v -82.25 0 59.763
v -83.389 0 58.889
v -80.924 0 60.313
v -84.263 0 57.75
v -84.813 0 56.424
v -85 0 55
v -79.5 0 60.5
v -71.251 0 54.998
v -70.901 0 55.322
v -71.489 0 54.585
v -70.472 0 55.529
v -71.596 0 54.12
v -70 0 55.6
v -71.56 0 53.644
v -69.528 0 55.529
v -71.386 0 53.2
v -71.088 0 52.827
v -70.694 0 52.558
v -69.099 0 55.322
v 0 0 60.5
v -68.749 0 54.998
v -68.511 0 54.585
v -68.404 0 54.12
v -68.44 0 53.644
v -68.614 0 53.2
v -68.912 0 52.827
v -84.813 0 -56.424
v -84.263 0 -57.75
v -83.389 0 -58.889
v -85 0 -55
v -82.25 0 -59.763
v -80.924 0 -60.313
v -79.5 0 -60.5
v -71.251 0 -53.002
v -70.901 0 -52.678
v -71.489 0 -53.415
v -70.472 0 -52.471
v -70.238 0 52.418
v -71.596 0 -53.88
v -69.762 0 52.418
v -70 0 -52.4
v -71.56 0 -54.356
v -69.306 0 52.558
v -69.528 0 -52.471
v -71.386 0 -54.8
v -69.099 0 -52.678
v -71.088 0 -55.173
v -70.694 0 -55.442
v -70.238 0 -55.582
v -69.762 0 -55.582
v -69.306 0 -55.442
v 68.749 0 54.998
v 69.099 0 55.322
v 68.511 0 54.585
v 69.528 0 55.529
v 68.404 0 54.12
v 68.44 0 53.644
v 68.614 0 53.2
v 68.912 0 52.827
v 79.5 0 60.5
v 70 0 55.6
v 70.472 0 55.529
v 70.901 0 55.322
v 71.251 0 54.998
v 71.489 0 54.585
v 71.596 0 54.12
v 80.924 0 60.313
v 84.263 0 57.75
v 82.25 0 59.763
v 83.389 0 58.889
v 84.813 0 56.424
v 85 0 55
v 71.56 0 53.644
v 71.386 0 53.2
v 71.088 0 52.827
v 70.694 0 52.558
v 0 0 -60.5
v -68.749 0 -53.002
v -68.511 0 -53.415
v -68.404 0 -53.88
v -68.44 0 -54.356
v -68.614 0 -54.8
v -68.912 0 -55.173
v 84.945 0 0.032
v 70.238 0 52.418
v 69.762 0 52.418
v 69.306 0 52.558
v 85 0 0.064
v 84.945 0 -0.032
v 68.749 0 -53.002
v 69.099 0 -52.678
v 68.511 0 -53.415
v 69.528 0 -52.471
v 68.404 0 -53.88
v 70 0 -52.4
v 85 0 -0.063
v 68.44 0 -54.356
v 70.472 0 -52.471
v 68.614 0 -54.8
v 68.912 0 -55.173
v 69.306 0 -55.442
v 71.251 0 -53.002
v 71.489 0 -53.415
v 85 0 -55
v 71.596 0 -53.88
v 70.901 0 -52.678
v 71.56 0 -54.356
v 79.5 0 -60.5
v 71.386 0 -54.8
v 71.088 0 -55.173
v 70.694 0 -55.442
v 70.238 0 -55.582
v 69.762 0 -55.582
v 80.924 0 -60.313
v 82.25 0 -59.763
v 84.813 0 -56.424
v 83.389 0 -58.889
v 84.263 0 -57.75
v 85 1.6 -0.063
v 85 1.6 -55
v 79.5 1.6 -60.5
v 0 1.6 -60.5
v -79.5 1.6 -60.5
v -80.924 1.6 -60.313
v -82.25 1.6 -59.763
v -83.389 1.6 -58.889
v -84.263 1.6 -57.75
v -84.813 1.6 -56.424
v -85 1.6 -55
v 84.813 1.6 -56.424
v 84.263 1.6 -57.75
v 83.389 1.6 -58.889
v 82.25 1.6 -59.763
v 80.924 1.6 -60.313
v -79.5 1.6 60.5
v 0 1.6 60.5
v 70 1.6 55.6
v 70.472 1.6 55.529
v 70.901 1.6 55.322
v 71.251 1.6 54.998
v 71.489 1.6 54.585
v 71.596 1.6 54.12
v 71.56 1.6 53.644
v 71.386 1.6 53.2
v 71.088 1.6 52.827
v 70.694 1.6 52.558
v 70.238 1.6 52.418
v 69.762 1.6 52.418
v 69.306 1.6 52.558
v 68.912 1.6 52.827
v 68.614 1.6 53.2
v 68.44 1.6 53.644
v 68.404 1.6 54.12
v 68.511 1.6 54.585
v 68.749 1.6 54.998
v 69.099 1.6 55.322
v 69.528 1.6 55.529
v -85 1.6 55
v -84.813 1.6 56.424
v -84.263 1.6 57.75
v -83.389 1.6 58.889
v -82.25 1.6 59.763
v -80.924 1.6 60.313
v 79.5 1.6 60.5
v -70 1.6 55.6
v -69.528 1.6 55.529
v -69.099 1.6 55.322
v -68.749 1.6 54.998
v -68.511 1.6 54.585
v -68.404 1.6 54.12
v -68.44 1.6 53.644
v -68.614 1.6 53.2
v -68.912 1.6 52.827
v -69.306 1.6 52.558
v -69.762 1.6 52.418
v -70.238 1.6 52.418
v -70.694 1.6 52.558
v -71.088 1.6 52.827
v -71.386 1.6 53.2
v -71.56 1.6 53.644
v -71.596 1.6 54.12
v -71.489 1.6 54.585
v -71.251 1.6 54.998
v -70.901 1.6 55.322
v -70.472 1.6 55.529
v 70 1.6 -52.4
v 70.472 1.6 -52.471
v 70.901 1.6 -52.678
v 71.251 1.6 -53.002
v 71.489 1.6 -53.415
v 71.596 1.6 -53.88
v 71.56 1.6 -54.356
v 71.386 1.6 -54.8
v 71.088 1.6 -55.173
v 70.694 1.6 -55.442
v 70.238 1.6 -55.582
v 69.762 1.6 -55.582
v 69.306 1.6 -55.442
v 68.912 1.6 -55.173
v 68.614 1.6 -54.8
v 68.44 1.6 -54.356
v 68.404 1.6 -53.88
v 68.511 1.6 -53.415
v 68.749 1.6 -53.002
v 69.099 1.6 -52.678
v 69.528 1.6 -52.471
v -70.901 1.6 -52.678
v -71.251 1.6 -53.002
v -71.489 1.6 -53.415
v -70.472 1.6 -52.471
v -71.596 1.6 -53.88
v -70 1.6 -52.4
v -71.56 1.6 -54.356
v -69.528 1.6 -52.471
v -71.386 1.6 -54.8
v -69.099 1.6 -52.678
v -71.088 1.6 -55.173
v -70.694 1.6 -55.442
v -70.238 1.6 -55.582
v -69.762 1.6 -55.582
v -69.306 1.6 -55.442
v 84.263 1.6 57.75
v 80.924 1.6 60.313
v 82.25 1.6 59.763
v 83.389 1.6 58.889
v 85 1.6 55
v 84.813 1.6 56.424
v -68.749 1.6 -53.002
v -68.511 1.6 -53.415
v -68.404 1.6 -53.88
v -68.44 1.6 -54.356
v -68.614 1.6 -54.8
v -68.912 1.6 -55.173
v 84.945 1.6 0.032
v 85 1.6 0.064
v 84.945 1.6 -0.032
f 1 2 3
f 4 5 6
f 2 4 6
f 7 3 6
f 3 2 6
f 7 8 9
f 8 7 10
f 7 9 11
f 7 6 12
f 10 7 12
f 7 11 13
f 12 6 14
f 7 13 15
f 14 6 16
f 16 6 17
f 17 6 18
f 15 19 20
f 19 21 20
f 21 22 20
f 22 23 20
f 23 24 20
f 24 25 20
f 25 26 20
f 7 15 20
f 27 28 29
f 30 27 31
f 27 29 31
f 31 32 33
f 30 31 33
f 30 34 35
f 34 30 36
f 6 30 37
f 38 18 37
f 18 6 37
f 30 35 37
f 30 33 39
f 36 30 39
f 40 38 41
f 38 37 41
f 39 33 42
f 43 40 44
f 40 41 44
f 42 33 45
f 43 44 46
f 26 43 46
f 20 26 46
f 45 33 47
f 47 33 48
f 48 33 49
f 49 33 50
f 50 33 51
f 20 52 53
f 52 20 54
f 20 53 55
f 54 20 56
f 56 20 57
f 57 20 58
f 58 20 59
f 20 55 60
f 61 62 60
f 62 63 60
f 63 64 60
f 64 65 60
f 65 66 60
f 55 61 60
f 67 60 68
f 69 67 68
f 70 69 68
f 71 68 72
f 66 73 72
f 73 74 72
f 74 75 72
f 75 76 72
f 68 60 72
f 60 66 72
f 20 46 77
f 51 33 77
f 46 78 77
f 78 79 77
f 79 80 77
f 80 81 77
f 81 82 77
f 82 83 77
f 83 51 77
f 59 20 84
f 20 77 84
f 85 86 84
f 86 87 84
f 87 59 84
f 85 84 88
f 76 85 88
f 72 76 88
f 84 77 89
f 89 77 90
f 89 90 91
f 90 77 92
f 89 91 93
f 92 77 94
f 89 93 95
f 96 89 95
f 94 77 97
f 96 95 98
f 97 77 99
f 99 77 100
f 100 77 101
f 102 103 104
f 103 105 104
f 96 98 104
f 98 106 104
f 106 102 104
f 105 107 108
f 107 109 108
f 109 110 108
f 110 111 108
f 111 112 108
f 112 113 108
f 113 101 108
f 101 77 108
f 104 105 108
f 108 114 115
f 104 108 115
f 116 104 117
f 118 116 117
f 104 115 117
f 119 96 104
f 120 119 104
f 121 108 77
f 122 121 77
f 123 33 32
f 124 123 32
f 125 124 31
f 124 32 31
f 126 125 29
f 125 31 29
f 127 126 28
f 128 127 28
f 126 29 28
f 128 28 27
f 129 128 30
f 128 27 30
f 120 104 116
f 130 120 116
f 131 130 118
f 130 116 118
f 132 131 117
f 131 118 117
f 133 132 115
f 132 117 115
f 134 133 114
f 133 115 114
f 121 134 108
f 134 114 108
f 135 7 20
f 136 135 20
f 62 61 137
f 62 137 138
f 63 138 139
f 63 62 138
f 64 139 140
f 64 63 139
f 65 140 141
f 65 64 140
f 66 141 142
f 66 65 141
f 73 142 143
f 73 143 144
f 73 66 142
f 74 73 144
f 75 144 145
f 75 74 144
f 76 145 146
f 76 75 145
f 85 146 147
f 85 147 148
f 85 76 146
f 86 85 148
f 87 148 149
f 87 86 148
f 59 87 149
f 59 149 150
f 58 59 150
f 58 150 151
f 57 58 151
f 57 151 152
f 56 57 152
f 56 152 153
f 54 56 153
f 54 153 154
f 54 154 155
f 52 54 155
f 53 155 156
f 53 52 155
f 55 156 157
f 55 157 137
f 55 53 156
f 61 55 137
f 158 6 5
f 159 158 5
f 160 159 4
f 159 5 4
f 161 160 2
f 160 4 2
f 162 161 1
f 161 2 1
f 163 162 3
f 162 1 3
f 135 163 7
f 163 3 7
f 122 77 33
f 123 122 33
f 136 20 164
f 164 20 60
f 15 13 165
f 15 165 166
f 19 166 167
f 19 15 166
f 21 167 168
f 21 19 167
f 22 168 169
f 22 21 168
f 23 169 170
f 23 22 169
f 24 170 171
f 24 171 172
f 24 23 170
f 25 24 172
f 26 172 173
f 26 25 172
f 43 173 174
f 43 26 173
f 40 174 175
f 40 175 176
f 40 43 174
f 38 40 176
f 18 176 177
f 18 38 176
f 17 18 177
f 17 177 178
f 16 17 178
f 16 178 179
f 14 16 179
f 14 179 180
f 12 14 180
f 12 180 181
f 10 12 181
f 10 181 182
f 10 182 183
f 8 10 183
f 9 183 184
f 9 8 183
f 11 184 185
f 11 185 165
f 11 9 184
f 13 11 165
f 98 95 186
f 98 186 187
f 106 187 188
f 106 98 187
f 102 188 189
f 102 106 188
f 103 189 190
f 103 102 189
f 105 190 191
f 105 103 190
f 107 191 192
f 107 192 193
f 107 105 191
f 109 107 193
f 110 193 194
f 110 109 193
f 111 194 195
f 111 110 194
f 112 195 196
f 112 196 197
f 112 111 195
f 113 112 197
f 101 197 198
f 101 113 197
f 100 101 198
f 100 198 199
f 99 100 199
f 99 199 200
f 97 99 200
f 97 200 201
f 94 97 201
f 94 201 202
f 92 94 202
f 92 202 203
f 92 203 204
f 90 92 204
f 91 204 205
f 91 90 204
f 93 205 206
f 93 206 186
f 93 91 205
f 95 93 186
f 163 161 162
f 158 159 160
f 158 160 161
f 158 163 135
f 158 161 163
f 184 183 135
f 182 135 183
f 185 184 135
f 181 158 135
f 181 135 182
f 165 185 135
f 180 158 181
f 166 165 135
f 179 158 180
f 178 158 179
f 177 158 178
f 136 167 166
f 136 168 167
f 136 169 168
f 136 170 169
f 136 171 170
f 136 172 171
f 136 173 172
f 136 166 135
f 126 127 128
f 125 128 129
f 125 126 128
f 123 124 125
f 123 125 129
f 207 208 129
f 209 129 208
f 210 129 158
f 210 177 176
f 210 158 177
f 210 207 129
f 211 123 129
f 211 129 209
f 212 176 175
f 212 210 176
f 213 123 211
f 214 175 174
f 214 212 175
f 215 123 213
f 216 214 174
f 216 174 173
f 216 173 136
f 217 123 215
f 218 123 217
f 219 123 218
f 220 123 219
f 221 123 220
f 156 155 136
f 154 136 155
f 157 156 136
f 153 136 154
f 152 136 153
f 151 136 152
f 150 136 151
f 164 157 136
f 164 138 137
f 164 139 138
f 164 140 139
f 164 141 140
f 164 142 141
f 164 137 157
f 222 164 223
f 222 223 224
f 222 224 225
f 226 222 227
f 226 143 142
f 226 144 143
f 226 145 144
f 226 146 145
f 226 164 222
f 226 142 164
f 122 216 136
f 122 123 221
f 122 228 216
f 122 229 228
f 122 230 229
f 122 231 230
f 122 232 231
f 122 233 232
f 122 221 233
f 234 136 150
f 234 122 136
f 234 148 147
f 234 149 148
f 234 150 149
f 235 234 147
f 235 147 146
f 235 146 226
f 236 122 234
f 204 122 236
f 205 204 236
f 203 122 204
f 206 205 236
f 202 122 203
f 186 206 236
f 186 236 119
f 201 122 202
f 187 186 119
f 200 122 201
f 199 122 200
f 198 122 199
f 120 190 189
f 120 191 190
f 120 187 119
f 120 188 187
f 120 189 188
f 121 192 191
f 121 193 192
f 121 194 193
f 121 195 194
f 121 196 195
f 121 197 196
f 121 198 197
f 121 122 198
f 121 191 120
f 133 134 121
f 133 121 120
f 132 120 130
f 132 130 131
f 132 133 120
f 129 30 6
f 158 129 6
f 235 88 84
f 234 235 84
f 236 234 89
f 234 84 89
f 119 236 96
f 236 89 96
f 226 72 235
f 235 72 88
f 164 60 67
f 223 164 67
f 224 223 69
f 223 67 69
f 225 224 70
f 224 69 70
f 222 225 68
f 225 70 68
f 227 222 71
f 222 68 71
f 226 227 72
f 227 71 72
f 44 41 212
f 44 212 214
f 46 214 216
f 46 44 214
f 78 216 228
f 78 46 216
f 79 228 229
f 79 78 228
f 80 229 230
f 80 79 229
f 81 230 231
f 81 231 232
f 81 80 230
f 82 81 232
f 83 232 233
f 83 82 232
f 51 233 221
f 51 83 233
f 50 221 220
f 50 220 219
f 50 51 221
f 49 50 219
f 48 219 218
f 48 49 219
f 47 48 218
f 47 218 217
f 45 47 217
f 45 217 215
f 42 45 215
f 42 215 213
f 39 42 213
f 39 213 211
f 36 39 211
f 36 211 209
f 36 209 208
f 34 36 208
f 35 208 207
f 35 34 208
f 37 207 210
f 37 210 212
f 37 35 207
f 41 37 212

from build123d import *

# Parameters (mm, degrees)
SKIZZE1_R                       = 1.59999934
AUFSATZ_LINEAR_AUSTRAGEN2_DEPTH = 1.6


with BuildPart() as part:
    # Skizze1 → Aufsatz-Linear austragen2 (new body)
    with BuildSketch(Plane(origin=(0, 0, 0), x_dir=(1, 0, 0), z_dir=(0, 1, 0))):
        with BuildLine():
            Line((0.000129244, 60.500005019), (-79.500003496, 60.499998316))
            ThreePointArc((-79.500003496, 60.499998316), (-83.389090307, 58.889085288), (-85.00000145, 54.999997696))
            Line((-85.00000145, 54.999997696), (-85.00000145, -54.999999283))
            ThreePointArc((-85.00000145, -54.999999283), (-83.389089945, -58.889083981), (-79.500005421, -60.499995903))
            Line((-79.500005421, -60.499995903), (-7.348e-06, -60.500004441))
            Line((-7.348e-06, -60.500004441), (79.499997674, -60.499997739))
            ThreePointArc((79.499997674, -60.499997739), (83.389083246, -58.889085422), (84.9999951, -54.999999659))
            Line((84.9999951, -54.999999659), (84.999993197, -0.063514366))
            ThreePointArc((84.999993197, -0.063514366), (84.936493195, -1.4365e-05), (84.999993199, 0.063485634))
            Line((84.999993199, 0.063485634), (84.99999637, 54.999998527))
            ThreePointArc((84.99999637, 54.999998527), (83.389084516, 58.889084164), (79.499999071, 60.499996481))
            Line((79.499999071, 60.499996481), (0.000129244, 60.500005019))
        make_face()
        with Locations(Location((-69.9999997, -54.00000122, 0), (0, 0, 270))):
            Circle(SKIZZE1_R, mode=Mode.SUBTRACT)
        with Locations(Location((69.9999997, -54.00000122, 0), (0, 0, 270))):
            Circle(SKIZZE1_R, mode=Mode.SUBTRACT)
        with Locations(Location((-69.9999997, 54.00000122, 0), (0, 0, 270))):
            Circle(SKIZZE1_R, mode=Mode.SUBTRACT)
        with Locations(Location((69.9999997, 54.00000122, 0), (0, 0, 270))):
            Circle(SKIZZE1_R, mode=Mode.SUBTRACT)
    extrude(amount=AUFSATZ_LINEAR_AUSTRAGEN2_DEPTH)


solid = part.part
